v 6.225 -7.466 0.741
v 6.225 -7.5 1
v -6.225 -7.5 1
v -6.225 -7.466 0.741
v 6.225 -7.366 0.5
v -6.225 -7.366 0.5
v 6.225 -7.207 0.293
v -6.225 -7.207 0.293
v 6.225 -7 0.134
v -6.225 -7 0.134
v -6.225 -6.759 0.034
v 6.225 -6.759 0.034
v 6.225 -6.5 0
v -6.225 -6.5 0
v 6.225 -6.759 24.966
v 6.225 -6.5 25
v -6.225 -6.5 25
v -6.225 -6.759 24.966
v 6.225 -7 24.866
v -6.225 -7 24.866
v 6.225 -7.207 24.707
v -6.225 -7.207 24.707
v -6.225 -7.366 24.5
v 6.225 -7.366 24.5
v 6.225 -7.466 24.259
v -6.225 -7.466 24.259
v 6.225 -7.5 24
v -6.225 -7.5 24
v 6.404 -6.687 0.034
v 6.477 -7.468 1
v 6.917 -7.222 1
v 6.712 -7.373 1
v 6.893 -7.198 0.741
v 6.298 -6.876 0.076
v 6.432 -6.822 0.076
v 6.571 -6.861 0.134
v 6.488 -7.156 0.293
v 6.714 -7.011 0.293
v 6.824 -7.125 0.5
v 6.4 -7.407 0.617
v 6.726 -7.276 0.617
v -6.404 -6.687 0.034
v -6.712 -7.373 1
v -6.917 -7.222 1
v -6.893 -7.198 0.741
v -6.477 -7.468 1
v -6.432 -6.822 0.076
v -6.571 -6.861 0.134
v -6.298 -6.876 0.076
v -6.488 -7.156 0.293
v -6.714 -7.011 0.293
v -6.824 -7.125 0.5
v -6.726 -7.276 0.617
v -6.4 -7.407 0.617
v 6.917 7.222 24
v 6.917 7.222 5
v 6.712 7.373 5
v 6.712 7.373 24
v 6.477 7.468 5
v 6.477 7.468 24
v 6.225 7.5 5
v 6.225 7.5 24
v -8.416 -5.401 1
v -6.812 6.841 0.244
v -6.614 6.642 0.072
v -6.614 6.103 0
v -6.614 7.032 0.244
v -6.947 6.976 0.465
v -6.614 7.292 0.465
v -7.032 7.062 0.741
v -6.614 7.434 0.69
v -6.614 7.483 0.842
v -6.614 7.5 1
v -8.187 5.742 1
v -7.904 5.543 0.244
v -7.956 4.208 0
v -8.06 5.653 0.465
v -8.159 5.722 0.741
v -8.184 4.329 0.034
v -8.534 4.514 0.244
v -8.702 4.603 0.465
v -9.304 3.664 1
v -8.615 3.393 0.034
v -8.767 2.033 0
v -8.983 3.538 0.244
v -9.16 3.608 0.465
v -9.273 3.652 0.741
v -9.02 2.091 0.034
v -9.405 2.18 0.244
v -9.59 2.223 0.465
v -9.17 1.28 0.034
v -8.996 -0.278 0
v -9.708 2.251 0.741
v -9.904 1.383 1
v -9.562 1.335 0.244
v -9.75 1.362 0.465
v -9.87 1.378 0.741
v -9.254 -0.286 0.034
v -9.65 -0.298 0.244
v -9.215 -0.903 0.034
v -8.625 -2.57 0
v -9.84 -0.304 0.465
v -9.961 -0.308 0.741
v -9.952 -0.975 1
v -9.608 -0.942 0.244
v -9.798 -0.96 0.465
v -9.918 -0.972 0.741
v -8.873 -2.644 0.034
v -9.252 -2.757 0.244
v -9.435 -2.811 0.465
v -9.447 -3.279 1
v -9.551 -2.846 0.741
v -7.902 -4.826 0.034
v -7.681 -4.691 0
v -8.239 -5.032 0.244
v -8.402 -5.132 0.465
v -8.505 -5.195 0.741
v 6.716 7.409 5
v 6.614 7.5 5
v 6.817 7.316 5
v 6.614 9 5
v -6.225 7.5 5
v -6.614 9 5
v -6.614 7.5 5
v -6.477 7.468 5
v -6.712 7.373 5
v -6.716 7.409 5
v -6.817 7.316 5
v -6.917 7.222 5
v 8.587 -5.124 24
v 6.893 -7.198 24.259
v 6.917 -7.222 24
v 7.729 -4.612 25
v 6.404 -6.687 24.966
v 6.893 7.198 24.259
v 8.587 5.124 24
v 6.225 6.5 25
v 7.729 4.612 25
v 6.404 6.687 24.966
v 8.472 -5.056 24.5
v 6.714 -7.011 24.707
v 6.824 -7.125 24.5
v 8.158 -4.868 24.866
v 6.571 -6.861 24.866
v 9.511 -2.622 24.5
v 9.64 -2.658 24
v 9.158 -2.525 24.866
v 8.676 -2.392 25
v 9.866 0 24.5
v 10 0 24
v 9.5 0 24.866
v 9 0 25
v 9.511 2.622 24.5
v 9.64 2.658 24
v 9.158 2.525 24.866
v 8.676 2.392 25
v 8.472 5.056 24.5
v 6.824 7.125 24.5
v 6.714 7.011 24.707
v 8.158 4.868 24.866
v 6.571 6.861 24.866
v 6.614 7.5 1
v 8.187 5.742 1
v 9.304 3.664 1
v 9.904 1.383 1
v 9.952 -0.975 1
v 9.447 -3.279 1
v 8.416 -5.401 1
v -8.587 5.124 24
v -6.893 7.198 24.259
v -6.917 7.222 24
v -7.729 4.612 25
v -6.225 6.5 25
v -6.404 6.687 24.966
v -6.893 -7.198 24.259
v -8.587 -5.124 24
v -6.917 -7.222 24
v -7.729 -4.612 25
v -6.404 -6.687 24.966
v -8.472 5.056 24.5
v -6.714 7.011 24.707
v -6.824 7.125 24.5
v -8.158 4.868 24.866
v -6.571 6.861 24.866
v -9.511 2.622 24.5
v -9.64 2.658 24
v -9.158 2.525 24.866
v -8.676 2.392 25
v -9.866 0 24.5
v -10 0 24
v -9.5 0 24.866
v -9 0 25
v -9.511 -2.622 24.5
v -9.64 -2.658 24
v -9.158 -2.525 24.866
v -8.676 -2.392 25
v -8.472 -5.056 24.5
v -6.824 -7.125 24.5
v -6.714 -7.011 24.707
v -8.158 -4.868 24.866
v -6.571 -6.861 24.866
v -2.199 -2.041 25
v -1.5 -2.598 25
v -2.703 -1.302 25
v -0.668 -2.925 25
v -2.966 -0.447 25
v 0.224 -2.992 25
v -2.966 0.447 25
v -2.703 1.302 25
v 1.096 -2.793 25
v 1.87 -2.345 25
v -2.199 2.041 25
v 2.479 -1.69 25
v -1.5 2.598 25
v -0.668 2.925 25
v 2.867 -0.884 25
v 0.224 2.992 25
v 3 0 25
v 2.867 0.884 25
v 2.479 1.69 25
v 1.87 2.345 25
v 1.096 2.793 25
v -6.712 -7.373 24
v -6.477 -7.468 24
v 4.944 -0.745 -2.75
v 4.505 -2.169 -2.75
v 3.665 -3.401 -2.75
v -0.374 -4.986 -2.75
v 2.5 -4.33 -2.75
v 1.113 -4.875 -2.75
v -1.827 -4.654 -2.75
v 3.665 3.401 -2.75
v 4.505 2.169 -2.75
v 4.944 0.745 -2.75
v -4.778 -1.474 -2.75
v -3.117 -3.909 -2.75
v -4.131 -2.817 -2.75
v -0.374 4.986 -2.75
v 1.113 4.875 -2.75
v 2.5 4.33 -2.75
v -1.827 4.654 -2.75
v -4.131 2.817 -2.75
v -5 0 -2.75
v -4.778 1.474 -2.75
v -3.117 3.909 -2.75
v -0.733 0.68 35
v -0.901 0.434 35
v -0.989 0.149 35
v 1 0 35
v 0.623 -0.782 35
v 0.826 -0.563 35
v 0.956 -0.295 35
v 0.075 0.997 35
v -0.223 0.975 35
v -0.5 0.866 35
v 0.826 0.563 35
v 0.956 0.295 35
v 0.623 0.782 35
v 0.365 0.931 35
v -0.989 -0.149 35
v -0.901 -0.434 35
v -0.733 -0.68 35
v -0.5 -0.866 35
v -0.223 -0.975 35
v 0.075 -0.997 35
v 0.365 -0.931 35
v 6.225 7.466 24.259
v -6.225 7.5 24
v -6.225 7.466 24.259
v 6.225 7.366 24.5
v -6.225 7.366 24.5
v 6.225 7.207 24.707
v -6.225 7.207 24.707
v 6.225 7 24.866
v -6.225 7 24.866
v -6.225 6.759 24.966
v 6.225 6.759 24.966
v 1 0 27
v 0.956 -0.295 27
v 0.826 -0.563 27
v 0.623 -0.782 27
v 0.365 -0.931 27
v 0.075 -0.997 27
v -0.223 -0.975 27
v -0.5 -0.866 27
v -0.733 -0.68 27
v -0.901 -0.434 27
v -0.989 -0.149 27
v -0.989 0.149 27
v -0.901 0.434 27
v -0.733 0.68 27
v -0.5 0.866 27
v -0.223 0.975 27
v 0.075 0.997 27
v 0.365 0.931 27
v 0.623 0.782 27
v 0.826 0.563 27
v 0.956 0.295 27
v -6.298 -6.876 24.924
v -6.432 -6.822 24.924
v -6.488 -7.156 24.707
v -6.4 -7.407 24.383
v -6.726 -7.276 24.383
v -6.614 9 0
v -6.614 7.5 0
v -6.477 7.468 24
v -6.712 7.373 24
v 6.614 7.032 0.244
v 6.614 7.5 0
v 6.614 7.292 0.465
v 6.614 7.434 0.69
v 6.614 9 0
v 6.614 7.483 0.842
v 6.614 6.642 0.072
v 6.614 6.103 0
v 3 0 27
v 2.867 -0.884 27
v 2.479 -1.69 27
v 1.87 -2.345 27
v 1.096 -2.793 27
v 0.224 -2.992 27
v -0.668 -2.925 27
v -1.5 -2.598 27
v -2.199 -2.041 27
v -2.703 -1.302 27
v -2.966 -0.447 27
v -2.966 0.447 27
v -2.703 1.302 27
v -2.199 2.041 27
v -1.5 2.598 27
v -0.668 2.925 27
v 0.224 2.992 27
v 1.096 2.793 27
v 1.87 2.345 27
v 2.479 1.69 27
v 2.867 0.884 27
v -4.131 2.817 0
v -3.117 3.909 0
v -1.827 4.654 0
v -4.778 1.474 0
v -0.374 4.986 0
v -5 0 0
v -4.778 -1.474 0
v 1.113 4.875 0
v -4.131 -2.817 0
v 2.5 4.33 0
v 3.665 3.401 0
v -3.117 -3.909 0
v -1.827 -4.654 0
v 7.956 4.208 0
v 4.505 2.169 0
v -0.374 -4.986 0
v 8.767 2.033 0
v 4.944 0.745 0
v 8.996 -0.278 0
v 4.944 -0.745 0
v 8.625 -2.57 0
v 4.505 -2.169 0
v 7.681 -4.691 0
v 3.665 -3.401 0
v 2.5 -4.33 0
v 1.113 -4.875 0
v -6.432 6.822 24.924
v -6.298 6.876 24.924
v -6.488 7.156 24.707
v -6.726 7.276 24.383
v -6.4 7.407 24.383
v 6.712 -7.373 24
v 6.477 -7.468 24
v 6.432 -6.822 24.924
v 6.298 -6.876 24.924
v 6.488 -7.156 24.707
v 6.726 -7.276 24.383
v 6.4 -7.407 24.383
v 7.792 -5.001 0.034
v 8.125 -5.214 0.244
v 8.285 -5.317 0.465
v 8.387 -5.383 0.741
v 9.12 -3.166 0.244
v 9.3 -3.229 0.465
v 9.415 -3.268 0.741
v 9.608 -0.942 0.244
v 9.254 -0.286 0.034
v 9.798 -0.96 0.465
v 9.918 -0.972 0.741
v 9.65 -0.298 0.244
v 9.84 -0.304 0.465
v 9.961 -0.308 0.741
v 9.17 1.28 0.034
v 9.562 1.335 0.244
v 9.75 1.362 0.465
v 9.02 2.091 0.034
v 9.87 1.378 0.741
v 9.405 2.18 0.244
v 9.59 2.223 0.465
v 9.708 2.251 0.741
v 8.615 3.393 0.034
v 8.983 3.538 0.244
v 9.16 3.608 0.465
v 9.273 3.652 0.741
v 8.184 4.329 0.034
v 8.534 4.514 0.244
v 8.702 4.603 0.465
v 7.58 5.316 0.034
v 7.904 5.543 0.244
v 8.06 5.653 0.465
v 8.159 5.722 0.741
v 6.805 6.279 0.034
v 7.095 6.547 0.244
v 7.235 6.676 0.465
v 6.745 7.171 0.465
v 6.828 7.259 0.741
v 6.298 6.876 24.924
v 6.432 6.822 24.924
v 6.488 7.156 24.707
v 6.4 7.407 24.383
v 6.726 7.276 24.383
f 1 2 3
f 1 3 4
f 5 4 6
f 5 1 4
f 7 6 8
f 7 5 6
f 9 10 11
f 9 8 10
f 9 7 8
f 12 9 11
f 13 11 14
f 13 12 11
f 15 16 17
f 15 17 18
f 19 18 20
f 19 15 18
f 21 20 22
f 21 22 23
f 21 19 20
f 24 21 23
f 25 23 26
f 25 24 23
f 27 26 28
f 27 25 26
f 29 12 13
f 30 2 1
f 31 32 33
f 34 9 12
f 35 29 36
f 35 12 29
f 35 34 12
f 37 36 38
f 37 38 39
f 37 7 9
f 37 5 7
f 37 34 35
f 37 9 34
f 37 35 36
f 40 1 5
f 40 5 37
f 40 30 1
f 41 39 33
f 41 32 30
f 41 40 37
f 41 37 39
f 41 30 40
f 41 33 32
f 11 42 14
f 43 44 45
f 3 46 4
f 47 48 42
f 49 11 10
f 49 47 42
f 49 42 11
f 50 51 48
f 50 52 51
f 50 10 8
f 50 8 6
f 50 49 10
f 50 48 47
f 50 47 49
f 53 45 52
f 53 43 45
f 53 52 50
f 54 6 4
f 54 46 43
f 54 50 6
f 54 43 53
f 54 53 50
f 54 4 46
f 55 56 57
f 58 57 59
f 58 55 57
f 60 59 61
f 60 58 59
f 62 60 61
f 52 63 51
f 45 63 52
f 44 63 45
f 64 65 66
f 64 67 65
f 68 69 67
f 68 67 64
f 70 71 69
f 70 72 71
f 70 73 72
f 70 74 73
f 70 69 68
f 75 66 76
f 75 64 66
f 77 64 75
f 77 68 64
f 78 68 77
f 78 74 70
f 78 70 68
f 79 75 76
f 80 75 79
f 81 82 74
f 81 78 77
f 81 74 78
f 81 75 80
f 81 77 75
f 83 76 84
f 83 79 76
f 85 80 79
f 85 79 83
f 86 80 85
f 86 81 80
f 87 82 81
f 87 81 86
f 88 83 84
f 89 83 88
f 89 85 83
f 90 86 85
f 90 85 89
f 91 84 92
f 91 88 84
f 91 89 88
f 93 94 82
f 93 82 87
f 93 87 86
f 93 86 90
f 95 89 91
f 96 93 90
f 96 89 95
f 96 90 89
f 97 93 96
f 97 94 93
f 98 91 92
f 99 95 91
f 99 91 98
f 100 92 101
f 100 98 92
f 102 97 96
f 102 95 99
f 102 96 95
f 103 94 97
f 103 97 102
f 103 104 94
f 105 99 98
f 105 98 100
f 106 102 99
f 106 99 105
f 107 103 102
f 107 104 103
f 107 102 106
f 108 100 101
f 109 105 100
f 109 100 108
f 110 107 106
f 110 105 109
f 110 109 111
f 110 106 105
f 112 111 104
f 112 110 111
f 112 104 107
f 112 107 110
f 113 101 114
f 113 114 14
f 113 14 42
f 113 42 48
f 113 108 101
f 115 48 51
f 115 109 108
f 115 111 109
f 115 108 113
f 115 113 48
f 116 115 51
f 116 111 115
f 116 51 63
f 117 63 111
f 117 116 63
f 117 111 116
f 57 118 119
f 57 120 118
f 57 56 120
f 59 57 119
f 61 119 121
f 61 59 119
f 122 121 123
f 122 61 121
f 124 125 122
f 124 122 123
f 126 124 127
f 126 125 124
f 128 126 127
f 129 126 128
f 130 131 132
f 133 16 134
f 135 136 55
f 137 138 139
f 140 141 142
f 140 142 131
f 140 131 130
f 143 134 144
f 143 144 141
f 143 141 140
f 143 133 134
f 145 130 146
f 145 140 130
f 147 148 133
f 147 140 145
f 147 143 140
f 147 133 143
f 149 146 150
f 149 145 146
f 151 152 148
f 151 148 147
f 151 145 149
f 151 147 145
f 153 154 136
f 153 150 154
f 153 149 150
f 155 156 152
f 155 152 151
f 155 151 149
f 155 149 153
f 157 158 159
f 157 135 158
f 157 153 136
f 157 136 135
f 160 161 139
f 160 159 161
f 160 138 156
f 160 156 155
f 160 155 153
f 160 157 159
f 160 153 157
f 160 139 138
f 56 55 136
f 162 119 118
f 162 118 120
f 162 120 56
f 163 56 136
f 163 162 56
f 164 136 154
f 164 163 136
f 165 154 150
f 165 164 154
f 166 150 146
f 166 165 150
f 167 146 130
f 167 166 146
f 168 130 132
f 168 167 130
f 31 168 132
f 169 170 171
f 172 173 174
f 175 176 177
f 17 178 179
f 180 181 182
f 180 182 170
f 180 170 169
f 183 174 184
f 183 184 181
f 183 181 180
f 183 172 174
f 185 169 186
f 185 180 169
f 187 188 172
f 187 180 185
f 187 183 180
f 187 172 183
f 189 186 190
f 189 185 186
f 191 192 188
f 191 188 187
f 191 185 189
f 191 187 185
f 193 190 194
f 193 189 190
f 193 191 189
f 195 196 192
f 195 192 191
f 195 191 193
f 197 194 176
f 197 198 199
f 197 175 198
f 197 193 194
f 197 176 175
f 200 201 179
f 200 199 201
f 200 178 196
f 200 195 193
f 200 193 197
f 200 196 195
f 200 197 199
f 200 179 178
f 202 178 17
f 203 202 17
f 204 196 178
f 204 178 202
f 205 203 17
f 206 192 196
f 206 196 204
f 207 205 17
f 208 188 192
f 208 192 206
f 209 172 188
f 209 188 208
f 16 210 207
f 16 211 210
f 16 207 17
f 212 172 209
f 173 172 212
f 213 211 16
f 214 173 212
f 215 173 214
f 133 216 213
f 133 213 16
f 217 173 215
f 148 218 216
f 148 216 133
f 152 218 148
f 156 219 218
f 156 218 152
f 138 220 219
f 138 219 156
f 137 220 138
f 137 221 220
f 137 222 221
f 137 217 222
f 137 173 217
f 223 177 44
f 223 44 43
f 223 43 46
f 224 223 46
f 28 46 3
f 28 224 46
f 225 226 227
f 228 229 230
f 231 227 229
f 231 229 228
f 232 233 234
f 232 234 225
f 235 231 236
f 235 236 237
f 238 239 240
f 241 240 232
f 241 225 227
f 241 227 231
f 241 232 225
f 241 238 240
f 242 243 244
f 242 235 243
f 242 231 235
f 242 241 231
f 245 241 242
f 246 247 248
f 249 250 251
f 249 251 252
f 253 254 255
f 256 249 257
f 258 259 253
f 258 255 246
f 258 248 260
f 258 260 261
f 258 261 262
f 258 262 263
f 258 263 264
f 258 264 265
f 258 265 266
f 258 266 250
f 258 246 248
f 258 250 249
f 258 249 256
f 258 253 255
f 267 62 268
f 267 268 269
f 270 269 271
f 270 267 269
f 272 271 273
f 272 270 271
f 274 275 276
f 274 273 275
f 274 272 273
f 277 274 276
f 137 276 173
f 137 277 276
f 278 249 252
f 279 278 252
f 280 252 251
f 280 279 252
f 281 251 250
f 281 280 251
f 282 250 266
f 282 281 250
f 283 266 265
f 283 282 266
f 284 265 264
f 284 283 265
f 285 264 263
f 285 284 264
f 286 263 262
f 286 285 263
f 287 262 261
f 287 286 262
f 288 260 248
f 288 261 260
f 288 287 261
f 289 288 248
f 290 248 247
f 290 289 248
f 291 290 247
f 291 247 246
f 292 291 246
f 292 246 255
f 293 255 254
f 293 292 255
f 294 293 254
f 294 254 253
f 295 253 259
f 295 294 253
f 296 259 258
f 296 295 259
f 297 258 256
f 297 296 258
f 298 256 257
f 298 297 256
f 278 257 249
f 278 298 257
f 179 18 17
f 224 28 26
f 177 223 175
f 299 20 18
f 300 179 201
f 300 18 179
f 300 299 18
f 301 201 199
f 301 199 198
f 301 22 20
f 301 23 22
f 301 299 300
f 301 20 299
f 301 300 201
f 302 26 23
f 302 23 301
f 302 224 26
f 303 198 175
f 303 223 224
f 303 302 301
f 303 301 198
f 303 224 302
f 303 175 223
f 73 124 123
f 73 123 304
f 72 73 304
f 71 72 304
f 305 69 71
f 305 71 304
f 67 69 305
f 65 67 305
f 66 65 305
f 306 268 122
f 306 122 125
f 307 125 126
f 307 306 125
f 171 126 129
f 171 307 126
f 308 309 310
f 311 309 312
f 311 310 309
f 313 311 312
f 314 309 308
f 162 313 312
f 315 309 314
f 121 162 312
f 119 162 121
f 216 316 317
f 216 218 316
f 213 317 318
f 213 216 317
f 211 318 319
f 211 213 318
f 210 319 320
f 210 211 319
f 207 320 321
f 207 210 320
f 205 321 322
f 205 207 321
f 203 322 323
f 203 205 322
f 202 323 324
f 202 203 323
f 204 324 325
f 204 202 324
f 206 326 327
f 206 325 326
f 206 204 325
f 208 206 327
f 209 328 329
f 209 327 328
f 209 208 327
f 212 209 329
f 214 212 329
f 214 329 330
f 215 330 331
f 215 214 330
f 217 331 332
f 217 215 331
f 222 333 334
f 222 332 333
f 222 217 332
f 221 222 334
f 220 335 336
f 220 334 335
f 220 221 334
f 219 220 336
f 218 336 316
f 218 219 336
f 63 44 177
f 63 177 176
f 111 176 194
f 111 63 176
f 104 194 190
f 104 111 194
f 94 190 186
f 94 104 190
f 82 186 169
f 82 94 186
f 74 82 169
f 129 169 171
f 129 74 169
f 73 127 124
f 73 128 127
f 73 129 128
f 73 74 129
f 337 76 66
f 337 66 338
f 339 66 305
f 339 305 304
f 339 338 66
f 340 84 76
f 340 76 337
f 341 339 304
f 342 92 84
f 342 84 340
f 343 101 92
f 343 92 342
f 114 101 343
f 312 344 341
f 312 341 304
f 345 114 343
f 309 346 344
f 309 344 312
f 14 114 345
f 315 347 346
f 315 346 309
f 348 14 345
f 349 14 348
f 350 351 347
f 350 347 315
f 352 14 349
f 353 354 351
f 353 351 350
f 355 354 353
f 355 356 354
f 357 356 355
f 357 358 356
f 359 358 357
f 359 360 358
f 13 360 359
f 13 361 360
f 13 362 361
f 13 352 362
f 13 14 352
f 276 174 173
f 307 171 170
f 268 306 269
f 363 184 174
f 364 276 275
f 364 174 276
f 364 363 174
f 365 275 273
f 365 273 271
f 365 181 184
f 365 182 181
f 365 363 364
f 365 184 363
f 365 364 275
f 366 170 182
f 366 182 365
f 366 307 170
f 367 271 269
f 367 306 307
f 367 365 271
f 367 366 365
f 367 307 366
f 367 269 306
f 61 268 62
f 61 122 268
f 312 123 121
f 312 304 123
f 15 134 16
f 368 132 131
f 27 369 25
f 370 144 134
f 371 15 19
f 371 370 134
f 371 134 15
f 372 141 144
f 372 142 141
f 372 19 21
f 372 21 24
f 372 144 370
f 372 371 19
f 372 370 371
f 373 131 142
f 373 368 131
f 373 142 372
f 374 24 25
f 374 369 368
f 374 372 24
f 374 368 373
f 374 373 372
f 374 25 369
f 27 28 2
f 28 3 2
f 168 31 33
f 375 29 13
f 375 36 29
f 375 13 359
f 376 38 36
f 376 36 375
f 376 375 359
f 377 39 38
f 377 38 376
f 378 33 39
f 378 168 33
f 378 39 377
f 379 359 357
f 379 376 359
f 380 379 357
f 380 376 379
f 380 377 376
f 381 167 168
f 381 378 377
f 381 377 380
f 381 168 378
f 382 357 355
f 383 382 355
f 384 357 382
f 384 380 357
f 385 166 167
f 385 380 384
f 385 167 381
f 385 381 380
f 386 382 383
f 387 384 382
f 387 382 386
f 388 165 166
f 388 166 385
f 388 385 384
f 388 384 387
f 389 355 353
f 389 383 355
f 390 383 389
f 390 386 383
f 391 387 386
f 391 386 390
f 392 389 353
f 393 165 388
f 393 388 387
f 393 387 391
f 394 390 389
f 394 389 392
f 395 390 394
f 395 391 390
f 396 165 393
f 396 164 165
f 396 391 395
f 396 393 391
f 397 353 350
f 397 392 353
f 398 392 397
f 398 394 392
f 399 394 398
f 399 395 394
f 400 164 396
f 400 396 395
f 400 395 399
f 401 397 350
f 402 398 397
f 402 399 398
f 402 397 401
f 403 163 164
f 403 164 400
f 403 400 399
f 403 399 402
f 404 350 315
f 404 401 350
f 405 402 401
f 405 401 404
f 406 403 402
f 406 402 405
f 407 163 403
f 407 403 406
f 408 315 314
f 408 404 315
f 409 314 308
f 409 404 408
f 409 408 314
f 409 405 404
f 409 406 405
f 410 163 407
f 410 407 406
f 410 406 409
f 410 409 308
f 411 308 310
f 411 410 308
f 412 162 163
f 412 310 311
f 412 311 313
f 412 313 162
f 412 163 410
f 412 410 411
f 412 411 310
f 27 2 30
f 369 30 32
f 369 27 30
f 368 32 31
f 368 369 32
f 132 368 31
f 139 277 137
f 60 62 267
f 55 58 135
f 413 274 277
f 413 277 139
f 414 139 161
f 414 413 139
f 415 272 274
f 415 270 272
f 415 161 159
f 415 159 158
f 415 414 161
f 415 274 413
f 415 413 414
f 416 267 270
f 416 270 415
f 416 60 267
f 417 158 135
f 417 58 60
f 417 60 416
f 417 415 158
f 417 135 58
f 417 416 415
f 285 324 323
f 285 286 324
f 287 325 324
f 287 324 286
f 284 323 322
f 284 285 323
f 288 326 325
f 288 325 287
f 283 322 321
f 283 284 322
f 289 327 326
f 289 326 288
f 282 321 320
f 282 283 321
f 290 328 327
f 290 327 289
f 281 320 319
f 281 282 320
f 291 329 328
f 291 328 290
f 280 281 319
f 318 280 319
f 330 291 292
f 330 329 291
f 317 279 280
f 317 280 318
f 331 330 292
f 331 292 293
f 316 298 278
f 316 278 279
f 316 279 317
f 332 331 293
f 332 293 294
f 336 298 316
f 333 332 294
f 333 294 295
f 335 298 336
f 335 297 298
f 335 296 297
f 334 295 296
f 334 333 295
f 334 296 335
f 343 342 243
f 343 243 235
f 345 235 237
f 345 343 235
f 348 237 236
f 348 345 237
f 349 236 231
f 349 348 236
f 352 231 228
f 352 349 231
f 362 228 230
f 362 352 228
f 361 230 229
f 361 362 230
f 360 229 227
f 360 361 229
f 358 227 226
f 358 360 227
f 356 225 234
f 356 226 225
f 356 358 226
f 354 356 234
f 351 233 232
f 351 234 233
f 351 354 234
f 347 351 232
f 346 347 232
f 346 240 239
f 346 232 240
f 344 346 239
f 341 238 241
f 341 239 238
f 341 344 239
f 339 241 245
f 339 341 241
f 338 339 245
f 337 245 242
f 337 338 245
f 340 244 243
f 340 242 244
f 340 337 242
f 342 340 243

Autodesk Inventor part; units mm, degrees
ref_plane "YZ Plane" through (0, 0, 0) normal (1, 0, 0) x (0, 1, 0)
ref_plane "XZ Plane" through (0, 0, 0) normal (0, 1, 0) x (-1, 0, 0)
ref_plane "XY Plane" through (0, 0, 0) normal (0, 0, 1) x (1, 0, 0)
sketch "Skizze1" plane through (0, 0, 0) normal (0, 0, 1) x (1, 0, 0)
  circle A0 centre (0, 0) radius 10
  line L0 (-6.6144, 7.5) -> (6.6144, 7.5)
  line L1 (-6.6144, -7.5) -> (6.6144, -7.5)
  dimension "d0" = 20
  dimension "d1" = 15
extrude "Extrusion1" add sketch "Skizze1" along normal blind 25 contours A0 L1 L0
sketch "Skizze2" plane through (0, 0, 25) normal (0, 0, 1) x (1, 0, 0)
  circle A0 centre (0, 0) radius 3
  dimension "d5" = 6
extrude "Extrusion2" add sketch "Skizze2" along normal blind 2
sketch "Skizze3" plane through (0, 0, 27) normal (0, 0, 1) x (1, 0, 0)
  circle A0 centre (0, 0) radius 1
  dimension "d8" = 2
extrude "Extrusion3" add sketch "Skizze3" along normal blind 8
sketch "Skizze5" plane through (-6.6144, 7.5, 0) normal (0, 1, 0) x (1, 0, 0)
  line L0 (0, 0) -> (13.2288, 0)
  line L1 (13.2288, 0) -> (13.2288, -5)
  line L2 (13.2288, -5) -> (0, -5)
  line L3 (0, -5) -> (0, 0)
  line L4 (13.2288, 0) -> (13.2288, -25) projected
  line L5 (0, 0) -> (0, -25) projected
  line L6 (13.2288, 0) -> (0, 0) projected
  point P0 (6.6144, 0)
  point P1 (13.2288, -2.5)
  point P2 (0, -2.5)
  dimension "d11" = 5
extrude "Extrusion4" add sketch "Skizze5" along normal blind 1.5
sketch "Skizze6" plane through (0, 0, 0) normal (0, 0, -1) x (-1, 0, 0)
  circle A0 centre (0, 0) radius 1 projected
  circle A1 centre (0, 0) radius 5
  dimension "d14" = 10
extrude "Extrusion5" add sketch "Skizze6" along normal blind 2.75 contours A0 | A1
fillet "Rundung2" radius 1 11 edges at (0, -7.5, 25) (-6.6144, -7.5, 12.5) (-10, 0, 25) (0, 7.5, 25) (10, 0, 25) (6.6144, -7.5, 12.5) (6.6144, 7.5, 15) (10, 0, 0) (-10, 0, 0) (-6.6144, 7.5, 15) (0, -7.5, 0)
properties part number "motor"
